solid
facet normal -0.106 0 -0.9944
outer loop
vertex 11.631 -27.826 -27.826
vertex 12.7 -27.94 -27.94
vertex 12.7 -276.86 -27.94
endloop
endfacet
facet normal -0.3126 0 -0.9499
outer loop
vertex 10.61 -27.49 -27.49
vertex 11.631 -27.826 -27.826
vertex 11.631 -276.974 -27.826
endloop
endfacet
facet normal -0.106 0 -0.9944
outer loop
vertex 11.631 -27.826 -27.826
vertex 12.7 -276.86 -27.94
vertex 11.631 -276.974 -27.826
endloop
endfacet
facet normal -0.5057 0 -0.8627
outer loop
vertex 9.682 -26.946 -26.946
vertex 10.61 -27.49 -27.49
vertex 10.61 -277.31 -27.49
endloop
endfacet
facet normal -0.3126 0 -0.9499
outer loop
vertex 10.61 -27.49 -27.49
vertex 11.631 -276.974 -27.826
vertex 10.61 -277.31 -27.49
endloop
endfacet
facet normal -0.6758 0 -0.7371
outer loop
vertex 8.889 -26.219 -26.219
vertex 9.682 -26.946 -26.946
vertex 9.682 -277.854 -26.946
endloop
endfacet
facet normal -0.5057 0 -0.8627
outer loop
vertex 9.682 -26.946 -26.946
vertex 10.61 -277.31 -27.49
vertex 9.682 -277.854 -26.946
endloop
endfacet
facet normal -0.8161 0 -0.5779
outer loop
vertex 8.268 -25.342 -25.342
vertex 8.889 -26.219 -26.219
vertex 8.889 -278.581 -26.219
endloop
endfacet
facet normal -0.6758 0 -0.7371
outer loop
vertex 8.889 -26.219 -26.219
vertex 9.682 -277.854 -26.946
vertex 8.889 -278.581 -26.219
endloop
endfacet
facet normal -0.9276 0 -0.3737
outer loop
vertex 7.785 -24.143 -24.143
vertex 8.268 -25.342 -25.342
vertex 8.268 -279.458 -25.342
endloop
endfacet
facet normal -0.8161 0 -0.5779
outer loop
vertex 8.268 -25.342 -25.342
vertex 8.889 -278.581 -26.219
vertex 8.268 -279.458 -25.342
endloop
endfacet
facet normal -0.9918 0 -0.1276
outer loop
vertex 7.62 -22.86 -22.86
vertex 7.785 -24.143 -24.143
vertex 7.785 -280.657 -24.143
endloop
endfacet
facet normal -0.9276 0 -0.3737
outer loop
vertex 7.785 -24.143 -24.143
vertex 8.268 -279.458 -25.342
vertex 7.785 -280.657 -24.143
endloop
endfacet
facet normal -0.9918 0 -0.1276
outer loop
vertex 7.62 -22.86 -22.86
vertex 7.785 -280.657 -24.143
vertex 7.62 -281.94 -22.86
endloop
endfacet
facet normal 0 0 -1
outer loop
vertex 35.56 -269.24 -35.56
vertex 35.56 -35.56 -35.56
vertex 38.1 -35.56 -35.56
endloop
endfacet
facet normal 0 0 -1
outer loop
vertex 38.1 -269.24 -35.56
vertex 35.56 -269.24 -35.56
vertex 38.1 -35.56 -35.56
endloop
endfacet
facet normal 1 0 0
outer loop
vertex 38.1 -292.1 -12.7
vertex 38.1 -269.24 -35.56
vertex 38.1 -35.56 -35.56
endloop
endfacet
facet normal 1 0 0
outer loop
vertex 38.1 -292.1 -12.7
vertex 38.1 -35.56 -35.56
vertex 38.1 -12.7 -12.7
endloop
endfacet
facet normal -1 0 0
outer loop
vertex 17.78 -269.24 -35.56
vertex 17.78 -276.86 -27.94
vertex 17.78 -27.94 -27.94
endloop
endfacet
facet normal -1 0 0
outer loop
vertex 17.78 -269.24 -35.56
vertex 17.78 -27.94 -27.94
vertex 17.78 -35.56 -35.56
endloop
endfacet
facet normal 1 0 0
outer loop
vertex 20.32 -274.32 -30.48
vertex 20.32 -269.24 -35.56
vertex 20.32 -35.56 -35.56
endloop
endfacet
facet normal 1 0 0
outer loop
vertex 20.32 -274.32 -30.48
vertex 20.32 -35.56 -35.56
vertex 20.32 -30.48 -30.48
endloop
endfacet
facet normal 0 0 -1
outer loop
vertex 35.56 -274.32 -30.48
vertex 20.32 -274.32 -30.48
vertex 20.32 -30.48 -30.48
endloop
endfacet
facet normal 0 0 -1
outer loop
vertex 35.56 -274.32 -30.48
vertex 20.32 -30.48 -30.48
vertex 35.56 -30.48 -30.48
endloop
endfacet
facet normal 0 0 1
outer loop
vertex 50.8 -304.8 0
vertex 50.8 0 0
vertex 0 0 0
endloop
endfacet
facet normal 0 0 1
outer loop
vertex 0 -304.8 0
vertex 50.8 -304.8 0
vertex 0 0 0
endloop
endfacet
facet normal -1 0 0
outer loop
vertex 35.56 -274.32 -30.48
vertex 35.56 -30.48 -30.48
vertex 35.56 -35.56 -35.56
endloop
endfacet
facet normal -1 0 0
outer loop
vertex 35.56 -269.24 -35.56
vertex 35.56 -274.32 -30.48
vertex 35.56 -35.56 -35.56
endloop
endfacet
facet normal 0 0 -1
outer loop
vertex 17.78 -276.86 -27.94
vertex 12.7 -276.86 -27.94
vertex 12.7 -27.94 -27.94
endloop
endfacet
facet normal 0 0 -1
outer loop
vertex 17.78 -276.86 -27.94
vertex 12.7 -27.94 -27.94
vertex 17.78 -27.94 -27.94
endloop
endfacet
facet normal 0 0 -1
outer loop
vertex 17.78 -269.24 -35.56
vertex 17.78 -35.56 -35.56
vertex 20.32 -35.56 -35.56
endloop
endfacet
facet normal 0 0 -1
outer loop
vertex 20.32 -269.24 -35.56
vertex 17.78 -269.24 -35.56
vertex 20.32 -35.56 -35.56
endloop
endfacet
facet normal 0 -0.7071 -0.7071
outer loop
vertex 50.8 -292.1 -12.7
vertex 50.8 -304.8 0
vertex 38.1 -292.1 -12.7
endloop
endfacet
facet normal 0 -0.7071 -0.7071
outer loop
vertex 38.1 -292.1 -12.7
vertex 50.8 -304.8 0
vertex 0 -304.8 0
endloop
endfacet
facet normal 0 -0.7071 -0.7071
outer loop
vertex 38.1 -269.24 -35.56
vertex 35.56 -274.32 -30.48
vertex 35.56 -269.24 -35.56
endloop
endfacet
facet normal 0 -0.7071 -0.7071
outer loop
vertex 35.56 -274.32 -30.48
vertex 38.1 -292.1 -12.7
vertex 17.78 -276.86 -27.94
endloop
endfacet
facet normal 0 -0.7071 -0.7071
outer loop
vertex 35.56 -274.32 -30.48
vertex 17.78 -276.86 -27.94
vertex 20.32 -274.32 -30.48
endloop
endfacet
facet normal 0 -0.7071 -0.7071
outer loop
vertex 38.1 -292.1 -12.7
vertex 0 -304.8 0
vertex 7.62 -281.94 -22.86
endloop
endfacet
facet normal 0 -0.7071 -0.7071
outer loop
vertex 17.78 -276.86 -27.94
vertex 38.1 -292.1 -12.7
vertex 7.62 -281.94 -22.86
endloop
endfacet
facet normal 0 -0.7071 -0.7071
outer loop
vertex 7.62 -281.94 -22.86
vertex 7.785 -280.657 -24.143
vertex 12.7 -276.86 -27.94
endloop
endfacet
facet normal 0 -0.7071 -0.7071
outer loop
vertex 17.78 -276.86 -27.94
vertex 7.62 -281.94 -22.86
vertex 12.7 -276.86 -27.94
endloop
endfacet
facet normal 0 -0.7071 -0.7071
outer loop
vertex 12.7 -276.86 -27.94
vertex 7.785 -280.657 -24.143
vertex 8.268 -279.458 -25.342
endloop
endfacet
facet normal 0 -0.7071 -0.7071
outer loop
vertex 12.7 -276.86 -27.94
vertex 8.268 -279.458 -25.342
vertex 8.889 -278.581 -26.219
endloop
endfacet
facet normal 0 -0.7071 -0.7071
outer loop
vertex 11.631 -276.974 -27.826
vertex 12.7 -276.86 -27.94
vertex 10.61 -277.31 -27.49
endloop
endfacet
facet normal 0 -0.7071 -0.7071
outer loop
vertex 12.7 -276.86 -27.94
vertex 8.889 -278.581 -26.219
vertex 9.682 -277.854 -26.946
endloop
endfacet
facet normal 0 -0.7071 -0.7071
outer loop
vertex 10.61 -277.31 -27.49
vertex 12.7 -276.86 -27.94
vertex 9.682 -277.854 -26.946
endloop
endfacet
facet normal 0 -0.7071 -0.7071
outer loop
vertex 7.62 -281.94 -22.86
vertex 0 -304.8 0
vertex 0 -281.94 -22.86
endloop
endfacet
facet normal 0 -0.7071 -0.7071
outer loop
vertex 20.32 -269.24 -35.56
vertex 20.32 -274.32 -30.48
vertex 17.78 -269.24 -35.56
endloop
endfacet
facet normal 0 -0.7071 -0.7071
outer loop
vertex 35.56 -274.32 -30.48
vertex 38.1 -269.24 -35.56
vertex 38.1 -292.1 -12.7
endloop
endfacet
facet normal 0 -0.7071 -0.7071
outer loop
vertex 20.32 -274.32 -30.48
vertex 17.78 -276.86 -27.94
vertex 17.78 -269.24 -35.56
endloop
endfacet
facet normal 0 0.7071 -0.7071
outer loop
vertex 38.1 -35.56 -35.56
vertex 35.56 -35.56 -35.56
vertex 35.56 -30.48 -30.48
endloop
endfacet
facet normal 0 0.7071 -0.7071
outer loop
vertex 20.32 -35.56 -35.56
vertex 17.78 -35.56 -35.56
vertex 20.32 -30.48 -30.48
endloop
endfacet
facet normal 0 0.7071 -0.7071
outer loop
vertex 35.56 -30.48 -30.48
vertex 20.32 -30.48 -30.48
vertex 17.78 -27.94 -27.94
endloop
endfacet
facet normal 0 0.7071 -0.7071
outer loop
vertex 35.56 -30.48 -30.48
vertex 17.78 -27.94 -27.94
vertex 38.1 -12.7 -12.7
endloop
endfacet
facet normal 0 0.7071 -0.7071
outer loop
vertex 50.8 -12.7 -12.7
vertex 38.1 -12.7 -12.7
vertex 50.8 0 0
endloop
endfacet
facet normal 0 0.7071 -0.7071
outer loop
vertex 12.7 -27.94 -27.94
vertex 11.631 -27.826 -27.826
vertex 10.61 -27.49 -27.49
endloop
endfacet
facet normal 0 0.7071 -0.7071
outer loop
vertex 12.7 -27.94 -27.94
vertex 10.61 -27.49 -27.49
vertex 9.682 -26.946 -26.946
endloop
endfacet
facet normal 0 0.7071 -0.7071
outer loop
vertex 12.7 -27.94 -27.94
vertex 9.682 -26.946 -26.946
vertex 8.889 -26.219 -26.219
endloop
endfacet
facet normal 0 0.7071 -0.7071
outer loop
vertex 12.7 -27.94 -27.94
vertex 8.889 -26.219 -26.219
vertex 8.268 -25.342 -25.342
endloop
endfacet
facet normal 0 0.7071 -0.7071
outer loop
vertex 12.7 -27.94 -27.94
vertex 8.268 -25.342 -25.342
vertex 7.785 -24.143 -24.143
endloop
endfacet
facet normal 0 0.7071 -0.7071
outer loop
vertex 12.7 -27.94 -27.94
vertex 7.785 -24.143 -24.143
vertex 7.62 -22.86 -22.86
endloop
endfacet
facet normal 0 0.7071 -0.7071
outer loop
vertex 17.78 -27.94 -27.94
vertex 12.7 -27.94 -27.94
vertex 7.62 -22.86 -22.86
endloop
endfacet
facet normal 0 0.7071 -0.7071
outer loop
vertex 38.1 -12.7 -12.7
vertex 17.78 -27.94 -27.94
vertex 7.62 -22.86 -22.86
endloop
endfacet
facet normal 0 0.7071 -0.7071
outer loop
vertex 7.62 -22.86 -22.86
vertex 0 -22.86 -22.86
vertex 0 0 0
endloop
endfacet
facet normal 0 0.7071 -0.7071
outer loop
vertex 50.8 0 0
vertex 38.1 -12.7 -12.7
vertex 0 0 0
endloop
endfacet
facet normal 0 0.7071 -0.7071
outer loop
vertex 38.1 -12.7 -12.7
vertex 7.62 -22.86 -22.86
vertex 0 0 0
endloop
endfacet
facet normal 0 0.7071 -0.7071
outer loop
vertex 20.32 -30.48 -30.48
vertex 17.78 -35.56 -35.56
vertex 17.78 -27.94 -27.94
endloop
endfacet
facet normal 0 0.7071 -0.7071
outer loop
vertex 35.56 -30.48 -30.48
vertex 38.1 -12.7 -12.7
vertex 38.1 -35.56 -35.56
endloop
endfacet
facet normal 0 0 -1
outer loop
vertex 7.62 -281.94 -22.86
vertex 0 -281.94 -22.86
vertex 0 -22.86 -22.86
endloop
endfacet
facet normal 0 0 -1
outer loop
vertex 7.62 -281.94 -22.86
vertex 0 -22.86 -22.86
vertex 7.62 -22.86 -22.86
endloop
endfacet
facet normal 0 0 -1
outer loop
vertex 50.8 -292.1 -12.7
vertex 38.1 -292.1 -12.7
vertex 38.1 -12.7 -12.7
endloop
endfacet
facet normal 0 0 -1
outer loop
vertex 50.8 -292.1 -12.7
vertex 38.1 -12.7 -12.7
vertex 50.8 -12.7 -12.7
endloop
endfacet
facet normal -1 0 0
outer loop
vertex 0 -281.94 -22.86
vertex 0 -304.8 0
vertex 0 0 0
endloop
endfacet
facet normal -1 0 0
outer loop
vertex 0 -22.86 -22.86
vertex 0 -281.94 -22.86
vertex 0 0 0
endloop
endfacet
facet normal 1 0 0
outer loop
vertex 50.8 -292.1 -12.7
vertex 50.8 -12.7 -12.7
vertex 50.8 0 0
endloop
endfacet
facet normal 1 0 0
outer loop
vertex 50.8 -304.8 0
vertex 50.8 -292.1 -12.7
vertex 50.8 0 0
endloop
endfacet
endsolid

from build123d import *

# Parameters (mm, degrees)
F1_DEPTH = 304.8
F3_DEPTH = 50.8
F4_R     = 5.07999


# Not quite as in the source:
# - a fillet or chamfer is up to 0.001 mm smaller than in the source, because OpenCascade refuses the exact size


with BuildPart() as f1:
    # F0 (on Front) → F1 (new body)
    with BuildSketch(Plane.XZ):
        Polygon((50.8, 0), (0, 0), (0, -22.86), (7.62, -22.86), (7.62, -27.94), (17.78, -27.94), (17.78, -35.56), (20.32, -35.56), (20.32, -30.48), (35.56, -30.48), (35.56, -35.56), (38.1, -35.56), (38.1, -12.7), (50.8, -12.7), align=None)
    extrude(amount=F1_DEPTH)

    # F2 (on face) → F3 (cut)
    with BuildSketch(Plane(origin=(0, 0, 0), x_dir=(0, -1, 0), z_dir=(-1, 0, 0))):
        Polygon((35.56, -35.56), (0, 0), (0, -35.56), align=None)
        Polygon((304.8, -35.56), (304.8, 0), (269.24, -35.56), align=None)
    extrude(amount=-F3_DEPTH, mode=Mode.SUBTRACT)

    # F4 (radius 5.08 in the source; OpenCascade refuses exactly that, so slightly less here)
    f4_edges = [f1.edges().sort_by_distance(p)[0] for p in [
        (7.62, -152.4, -27.94),
    ]]
    fillet(f4_edges, radius=F4_R)


solid = f1.part
